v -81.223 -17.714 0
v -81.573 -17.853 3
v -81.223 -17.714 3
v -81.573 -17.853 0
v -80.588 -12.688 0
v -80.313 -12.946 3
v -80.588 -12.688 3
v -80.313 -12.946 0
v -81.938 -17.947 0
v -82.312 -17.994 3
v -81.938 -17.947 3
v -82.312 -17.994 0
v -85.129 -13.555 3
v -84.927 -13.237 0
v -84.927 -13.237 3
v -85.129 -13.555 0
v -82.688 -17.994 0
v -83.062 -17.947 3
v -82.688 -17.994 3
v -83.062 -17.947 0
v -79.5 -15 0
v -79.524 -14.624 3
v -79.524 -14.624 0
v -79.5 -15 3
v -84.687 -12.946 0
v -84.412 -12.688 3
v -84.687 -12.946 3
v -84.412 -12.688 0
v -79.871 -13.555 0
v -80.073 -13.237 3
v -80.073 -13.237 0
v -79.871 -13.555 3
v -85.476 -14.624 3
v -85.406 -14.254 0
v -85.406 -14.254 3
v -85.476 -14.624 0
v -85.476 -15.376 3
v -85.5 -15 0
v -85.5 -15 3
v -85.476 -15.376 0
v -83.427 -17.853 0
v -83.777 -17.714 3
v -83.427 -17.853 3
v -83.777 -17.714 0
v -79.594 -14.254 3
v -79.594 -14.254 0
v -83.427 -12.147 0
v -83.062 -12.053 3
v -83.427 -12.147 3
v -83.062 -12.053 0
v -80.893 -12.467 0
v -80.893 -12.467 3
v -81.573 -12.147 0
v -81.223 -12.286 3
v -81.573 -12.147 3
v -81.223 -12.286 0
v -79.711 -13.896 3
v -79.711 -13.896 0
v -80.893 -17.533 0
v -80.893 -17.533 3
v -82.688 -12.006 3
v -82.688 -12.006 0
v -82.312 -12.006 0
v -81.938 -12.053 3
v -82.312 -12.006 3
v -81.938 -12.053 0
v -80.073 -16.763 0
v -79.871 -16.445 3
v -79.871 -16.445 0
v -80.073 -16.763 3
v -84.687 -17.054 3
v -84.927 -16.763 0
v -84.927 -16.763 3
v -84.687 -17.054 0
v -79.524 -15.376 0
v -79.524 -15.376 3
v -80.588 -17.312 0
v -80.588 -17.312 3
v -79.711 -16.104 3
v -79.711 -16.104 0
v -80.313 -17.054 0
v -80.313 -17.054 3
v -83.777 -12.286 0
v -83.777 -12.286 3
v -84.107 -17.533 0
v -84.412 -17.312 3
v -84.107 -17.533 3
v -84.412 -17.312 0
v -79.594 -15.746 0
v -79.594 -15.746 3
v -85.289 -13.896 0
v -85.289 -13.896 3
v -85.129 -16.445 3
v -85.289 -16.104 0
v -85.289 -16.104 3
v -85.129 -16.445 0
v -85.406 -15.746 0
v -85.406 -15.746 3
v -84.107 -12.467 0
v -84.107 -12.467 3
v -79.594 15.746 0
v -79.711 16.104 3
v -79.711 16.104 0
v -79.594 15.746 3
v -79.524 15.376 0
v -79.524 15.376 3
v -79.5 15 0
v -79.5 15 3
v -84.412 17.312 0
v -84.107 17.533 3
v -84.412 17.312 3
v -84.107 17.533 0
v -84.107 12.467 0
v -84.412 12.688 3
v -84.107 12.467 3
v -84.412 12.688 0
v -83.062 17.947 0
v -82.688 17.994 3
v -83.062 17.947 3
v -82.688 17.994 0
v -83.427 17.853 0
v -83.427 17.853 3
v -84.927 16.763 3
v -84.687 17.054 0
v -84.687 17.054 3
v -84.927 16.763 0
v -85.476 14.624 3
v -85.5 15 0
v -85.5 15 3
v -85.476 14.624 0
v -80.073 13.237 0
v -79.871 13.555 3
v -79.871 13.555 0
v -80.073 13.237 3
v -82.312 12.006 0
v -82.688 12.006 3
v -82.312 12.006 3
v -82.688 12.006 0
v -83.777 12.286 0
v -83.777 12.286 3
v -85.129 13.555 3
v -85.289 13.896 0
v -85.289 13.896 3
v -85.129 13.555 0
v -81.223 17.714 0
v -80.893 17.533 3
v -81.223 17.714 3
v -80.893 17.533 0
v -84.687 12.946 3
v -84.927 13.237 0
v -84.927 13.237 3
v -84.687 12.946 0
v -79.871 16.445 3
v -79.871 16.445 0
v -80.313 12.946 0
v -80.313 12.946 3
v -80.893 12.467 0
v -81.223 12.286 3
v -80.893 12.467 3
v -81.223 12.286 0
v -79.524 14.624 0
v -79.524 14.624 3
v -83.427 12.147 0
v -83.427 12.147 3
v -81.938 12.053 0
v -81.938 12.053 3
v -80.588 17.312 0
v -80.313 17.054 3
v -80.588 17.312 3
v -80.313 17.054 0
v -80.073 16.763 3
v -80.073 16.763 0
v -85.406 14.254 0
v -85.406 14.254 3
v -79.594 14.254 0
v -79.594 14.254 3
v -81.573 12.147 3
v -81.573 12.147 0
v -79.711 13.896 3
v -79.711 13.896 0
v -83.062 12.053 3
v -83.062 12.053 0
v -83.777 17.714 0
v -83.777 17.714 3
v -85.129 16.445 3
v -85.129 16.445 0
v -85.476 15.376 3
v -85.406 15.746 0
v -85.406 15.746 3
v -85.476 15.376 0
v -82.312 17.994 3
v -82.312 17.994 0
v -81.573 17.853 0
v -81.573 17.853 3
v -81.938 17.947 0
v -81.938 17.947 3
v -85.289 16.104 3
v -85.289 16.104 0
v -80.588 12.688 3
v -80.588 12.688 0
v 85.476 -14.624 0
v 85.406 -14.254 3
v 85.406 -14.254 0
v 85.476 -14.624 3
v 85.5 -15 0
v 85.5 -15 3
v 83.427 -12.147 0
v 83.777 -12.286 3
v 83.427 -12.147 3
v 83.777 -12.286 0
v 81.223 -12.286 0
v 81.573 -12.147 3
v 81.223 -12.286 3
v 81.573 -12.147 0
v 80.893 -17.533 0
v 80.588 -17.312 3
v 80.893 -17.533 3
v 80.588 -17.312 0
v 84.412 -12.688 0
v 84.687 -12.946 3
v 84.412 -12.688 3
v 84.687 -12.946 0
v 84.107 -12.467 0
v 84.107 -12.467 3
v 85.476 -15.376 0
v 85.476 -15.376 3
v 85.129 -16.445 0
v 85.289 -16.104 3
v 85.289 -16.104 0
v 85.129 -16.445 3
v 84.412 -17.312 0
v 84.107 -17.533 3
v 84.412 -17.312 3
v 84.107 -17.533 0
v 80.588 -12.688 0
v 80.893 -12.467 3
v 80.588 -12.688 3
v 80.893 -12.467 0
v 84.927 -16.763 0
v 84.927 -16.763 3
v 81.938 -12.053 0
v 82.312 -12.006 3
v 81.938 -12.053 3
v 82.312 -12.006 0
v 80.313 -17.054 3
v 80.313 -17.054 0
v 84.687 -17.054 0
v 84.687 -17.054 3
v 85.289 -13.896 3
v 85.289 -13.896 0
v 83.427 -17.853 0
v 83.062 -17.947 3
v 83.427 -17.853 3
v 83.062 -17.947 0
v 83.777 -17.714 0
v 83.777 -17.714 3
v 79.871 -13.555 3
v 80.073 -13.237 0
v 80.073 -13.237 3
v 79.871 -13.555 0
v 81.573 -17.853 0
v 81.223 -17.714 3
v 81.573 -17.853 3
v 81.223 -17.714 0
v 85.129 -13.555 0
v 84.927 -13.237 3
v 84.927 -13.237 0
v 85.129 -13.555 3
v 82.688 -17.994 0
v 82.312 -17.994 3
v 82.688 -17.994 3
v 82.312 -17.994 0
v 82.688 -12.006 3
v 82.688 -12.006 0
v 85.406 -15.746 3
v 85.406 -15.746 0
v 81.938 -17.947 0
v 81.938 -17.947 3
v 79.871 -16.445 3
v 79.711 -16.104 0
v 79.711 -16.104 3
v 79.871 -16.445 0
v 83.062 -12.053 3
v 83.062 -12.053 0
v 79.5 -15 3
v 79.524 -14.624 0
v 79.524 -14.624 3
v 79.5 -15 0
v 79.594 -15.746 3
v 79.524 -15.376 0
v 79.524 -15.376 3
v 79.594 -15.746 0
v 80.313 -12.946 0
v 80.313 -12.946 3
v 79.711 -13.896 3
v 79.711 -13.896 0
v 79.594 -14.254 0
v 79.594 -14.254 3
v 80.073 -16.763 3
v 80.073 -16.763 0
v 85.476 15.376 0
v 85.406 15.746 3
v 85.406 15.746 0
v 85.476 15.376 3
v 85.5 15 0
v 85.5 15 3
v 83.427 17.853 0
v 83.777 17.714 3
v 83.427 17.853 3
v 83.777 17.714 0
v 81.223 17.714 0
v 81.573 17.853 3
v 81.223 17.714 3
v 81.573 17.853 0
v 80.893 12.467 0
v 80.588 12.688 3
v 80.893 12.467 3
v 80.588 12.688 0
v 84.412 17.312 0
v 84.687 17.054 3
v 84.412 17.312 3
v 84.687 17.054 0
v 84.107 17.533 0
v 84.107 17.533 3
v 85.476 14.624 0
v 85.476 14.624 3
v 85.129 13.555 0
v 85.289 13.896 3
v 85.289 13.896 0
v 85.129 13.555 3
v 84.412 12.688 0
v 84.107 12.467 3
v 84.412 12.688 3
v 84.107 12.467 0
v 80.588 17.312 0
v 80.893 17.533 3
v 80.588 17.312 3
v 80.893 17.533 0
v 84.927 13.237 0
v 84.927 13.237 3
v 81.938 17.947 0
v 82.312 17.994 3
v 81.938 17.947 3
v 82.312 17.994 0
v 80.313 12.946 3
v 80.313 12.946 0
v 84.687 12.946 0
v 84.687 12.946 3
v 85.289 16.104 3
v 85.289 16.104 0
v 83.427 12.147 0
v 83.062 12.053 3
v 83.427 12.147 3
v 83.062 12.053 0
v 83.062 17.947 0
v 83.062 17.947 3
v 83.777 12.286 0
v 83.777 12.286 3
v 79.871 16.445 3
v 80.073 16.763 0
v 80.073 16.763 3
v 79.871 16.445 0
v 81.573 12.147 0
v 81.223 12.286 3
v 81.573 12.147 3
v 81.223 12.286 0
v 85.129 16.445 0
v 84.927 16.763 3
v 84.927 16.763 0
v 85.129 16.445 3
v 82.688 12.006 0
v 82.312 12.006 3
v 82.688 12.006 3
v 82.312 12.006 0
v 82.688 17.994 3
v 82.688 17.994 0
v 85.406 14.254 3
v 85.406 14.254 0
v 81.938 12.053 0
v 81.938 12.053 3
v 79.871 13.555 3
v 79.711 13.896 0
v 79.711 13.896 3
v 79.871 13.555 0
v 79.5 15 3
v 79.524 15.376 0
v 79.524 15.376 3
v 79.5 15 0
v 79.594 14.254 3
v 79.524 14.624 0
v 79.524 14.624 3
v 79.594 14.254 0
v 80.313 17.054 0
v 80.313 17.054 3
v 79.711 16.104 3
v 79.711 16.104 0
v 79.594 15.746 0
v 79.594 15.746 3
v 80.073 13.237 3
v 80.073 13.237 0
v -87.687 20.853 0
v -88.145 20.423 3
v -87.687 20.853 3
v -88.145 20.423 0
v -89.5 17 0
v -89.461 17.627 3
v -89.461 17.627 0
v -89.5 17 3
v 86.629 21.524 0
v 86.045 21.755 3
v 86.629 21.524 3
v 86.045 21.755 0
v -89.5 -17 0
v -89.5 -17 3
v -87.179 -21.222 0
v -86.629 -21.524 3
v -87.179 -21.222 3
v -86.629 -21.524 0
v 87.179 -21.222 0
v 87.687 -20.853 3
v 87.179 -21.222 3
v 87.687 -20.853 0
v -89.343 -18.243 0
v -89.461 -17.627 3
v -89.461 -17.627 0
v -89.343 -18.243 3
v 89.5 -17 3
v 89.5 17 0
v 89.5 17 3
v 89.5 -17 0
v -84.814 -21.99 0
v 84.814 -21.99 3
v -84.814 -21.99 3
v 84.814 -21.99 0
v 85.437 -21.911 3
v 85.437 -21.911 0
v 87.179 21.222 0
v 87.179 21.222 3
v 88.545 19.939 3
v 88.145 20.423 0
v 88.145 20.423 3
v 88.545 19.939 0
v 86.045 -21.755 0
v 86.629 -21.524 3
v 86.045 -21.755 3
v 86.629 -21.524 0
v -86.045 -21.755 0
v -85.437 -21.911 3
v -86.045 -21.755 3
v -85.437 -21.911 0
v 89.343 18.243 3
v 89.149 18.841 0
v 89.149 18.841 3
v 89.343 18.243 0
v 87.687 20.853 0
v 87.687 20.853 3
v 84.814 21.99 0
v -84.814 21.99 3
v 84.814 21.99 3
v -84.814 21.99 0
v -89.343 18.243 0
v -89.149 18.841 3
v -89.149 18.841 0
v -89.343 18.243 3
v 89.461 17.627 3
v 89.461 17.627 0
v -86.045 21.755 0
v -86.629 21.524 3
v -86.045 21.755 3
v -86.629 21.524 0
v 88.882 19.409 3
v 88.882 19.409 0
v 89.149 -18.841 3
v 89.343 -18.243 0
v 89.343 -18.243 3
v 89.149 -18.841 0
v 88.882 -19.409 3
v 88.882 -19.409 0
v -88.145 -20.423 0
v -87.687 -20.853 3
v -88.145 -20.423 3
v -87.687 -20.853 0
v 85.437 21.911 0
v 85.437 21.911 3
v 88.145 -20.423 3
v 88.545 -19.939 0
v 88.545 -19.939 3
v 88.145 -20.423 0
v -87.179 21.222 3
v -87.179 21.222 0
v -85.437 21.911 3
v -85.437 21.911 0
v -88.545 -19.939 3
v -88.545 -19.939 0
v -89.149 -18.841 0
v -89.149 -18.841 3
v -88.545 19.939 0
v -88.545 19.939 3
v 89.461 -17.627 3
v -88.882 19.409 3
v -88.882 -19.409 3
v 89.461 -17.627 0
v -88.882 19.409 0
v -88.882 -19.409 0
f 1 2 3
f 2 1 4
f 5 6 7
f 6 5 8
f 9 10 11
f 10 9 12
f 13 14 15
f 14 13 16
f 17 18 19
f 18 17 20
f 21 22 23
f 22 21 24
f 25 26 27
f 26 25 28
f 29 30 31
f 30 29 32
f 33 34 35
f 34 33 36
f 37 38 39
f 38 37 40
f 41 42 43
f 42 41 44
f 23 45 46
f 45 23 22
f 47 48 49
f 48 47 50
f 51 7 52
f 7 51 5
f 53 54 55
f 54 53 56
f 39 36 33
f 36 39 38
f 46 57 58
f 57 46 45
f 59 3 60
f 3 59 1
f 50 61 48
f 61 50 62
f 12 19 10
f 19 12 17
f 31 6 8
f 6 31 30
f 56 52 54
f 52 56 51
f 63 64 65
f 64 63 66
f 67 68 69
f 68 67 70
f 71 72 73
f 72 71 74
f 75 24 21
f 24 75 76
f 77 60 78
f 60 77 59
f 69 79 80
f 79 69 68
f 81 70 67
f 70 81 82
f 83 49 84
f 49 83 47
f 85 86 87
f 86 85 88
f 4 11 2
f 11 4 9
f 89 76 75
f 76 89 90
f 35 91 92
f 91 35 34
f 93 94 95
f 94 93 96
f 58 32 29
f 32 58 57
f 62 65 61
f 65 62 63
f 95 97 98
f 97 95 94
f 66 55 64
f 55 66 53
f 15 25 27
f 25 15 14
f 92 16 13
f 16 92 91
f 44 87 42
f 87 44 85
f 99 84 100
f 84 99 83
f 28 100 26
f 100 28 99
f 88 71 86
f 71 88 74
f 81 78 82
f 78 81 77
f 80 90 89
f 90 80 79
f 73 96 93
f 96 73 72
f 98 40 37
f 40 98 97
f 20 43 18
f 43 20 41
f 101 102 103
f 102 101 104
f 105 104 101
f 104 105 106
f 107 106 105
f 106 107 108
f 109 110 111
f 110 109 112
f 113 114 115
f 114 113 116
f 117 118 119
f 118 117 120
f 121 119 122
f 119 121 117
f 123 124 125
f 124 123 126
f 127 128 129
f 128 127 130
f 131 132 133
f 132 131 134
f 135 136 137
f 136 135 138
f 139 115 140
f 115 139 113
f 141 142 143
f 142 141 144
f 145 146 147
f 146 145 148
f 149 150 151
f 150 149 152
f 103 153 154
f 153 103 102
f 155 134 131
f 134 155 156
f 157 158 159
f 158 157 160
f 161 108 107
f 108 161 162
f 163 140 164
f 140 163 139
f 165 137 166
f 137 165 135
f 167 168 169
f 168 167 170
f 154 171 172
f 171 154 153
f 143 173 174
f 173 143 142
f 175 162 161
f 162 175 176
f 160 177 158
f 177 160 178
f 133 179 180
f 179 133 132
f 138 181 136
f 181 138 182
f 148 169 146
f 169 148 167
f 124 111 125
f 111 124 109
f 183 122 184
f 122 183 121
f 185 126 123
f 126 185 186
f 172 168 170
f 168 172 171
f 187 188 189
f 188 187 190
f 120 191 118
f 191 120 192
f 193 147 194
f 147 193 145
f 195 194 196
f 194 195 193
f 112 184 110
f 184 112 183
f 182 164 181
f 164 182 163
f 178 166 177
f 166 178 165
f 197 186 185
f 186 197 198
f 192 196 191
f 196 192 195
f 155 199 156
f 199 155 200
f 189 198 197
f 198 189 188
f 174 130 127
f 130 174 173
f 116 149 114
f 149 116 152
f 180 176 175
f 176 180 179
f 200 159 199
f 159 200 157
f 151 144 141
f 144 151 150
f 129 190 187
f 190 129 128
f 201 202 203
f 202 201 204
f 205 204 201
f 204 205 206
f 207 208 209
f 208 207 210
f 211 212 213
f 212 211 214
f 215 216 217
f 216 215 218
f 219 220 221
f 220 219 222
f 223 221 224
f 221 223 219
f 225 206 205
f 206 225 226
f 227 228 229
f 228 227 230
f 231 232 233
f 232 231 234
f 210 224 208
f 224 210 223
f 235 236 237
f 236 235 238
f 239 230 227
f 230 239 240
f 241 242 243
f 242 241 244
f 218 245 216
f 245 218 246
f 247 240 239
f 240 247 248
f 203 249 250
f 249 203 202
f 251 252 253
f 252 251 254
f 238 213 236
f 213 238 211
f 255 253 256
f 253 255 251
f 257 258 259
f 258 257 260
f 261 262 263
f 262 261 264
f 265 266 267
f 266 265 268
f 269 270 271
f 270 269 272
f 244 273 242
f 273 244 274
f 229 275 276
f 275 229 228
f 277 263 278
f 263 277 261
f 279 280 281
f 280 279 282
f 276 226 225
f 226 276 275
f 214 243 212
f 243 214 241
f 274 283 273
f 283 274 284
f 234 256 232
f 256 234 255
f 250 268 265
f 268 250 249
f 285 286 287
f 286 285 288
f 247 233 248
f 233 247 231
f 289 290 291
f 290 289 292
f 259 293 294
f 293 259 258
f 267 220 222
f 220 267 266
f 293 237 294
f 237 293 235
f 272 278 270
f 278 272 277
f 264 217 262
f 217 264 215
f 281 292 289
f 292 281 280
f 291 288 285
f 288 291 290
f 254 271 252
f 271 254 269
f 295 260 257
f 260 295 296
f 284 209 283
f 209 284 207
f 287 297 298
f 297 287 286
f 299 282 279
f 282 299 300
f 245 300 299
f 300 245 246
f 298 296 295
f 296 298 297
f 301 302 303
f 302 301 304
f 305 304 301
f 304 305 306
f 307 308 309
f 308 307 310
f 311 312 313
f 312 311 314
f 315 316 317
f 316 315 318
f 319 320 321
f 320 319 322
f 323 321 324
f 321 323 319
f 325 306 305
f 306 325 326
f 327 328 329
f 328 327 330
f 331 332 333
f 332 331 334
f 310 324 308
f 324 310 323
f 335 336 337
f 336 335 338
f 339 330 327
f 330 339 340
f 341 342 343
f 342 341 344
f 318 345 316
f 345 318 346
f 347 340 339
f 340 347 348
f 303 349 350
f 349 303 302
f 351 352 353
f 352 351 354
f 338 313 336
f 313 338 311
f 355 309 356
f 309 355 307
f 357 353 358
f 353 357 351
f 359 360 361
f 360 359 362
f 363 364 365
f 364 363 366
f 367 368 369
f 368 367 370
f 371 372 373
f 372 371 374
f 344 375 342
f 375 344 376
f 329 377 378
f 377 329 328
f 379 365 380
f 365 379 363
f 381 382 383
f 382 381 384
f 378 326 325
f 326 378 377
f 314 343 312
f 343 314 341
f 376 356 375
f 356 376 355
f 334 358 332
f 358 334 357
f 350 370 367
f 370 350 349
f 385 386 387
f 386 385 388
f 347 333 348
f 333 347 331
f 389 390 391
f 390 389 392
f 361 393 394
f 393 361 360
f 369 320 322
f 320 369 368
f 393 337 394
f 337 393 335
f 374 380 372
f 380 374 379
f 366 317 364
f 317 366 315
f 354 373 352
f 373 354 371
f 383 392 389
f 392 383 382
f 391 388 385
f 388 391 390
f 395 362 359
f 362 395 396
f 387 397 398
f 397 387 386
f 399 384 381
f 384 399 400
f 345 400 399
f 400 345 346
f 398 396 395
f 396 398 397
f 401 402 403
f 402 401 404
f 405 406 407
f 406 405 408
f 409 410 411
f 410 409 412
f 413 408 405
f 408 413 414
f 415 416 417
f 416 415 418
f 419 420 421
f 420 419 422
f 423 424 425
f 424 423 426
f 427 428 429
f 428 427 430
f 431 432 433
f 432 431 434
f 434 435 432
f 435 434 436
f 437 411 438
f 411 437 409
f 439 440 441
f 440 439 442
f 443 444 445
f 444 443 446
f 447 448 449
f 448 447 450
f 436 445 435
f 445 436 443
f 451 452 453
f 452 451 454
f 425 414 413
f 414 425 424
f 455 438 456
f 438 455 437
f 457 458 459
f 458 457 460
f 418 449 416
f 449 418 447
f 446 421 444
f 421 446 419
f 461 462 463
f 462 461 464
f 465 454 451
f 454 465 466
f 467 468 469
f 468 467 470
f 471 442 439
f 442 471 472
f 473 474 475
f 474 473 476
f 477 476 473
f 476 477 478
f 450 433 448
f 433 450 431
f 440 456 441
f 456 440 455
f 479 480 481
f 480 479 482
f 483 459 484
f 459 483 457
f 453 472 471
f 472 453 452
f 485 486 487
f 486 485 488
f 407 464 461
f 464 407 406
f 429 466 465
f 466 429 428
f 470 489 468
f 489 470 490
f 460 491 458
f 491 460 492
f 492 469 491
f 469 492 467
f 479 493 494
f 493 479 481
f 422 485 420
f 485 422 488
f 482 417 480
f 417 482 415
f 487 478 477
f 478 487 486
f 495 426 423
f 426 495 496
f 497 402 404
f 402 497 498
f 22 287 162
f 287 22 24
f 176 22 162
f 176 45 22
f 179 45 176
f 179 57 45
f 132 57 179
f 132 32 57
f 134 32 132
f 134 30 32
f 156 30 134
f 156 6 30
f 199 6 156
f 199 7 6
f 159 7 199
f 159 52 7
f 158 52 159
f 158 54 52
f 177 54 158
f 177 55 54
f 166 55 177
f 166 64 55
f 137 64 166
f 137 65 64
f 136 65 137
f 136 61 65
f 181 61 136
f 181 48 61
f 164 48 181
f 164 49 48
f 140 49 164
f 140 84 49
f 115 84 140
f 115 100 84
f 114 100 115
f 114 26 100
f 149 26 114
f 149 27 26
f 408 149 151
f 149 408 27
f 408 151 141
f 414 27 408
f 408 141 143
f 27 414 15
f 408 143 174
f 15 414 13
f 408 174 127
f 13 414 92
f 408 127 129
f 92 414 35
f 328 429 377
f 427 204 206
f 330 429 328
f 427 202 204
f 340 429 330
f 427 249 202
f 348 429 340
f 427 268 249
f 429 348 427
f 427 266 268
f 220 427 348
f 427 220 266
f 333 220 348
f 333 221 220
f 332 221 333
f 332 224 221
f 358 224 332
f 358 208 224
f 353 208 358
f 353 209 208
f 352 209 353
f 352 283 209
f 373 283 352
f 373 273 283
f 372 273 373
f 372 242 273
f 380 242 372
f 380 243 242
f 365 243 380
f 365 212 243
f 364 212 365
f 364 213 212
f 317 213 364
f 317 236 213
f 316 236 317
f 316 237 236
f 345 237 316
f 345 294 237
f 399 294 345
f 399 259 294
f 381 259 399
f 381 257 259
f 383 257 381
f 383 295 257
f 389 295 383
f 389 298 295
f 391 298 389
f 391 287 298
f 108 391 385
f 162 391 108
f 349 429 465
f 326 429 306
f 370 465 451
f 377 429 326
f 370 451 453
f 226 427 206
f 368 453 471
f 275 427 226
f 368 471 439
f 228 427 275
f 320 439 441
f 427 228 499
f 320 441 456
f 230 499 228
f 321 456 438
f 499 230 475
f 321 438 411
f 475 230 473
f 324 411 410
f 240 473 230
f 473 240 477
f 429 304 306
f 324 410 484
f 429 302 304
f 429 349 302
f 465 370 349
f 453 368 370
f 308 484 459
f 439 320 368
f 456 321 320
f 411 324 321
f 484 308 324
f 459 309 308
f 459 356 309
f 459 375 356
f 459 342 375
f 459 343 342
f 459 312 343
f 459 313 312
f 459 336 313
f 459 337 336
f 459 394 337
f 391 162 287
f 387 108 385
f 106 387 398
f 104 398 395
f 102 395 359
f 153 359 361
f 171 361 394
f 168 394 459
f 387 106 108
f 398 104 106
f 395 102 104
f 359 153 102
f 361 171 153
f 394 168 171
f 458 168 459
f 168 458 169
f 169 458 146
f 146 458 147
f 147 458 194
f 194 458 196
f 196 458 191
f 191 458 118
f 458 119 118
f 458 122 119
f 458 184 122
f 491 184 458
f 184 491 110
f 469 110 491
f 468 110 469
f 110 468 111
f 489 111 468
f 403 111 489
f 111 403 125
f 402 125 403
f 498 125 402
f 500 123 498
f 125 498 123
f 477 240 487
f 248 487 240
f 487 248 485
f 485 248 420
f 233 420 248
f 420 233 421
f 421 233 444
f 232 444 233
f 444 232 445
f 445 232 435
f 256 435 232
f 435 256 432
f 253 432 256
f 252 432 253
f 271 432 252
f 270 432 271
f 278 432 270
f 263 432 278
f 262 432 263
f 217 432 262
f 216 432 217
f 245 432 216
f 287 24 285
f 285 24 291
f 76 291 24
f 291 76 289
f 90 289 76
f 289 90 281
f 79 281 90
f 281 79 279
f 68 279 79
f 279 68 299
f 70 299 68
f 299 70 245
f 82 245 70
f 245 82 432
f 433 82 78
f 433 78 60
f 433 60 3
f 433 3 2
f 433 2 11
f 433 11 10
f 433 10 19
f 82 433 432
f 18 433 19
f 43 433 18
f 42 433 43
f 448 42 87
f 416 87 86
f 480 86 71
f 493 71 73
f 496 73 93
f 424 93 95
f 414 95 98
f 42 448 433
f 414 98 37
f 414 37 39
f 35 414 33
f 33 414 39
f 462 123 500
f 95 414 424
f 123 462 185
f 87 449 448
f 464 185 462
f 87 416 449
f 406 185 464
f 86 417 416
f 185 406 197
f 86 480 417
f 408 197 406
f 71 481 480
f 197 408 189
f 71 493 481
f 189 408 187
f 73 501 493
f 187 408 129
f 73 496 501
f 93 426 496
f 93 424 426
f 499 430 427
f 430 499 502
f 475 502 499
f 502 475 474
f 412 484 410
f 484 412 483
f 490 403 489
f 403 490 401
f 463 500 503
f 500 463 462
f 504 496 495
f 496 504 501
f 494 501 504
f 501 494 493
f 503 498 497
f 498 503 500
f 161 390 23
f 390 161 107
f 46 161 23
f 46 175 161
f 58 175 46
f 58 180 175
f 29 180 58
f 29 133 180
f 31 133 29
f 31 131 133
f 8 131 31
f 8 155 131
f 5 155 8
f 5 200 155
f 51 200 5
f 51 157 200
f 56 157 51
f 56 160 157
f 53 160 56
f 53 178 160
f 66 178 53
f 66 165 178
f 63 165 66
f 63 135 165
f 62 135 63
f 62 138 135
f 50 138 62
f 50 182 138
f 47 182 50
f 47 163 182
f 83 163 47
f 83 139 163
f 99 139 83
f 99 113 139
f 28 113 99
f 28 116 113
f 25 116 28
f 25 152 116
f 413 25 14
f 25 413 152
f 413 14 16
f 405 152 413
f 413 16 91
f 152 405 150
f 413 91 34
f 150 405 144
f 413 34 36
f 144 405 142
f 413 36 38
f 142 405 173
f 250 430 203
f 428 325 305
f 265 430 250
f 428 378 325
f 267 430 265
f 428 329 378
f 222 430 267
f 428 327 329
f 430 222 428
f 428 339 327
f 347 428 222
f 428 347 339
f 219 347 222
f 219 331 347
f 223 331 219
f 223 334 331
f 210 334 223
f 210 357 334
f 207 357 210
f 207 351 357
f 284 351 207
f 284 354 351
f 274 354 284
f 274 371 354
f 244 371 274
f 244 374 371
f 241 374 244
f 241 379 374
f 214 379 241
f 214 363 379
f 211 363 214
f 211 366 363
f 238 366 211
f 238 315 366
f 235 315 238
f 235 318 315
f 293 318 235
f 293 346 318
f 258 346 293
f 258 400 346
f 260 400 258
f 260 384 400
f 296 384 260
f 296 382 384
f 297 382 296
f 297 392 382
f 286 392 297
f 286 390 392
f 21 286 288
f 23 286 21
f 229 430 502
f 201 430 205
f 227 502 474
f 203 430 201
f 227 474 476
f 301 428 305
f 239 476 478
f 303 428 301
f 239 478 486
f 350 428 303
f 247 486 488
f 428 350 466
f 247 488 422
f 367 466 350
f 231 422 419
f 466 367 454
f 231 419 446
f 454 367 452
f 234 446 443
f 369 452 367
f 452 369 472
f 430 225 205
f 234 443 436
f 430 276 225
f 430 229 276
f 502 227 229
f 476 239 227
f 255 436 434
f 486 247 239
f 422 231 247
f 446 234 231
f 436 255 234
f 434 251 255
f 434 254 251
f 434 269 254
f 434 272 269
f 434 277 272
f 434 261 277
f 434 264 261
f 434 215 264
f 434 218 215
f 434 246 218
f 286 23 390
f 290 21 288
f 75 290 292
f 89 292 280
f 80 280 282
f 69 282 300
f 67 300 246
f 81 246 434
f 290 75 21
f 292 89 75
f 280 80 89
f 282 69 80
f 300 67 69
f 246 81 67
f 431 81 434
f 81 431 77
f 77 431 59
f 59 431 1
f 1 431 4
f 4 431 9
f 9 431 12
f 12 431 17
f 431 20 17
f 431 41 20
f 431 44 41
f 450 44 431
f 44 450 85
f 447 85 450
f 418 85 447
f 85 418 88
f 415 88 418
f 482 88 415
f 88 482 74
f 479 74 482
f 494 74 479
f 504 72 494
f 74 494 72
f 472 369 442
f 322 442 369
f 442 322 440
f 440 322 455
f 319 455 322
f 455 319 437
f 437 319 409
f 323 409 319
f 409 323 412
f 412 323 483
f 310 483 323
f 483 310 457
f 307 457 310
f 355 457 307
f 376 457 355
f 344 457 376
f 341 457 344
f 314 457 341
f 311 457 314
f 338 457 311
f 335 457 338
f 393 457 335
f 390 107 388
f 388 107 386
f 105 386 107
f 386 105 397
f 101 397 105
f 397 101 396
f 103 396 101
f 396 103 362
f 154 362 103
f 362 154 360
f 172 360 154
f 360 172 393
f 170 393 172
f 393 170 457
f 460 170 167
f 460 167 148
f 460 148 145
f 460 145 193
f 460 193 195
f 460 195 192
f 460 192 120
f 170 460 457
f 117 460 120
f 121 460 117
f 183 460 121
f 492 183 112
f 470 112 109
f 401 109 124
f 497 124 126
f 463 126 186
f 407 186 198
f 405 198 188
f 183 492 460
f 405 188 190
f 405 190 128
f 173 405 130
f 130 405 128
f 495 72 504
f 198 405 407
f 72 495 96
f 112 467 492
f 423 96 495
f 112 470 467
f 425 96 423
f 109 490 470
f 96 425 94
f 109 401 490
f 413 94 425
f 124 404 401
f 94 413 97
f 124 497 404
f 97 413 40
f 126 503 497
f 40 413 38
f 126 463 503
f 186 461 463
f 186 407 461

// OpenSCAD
$fn = 50;


difference() {
	union() {
		hull() {
			translate(v = [-84.5000000000, 17.0000000000, 0]) {
				cylinder(h = 3, r = 5);
			}
			translate(v = [84.5000000000, 17.0000000000, 0]) {
				cylinder(h = 3, r = 5);
			}
			translate(v = [-84.5000000000, -17.0000000000, 0]) {
				cylinder(h = 3, r = 5);
			}
			translate(v = [84.5000000000, -17.0000000000, 0]) {
				cylinder(h = 3, r = 5);
			}
		}
	}
	union() {
		translate(v = [-82.5000000000, -15.0000000000, -100.0000000000]) {
			cylinder(h = 200, r = 3.0000000000);
		}
		translate(v = [-82.5000000000, 15.0000000000, -100.0000000000]) {
			cylinder(h = 200, r = 3.0000000000);
		}
		translate(v = [82.5000000000, -15.0000000000, -100.0000000000]) {
			cylinder(h = 200, r = 3.0000000000);
		}
		translate(v = [82.5000000000, 15.0000000000, -100.0000000000]) {
			cylinder(h = 200, r = 3.0000000000);
		}
	}
}
